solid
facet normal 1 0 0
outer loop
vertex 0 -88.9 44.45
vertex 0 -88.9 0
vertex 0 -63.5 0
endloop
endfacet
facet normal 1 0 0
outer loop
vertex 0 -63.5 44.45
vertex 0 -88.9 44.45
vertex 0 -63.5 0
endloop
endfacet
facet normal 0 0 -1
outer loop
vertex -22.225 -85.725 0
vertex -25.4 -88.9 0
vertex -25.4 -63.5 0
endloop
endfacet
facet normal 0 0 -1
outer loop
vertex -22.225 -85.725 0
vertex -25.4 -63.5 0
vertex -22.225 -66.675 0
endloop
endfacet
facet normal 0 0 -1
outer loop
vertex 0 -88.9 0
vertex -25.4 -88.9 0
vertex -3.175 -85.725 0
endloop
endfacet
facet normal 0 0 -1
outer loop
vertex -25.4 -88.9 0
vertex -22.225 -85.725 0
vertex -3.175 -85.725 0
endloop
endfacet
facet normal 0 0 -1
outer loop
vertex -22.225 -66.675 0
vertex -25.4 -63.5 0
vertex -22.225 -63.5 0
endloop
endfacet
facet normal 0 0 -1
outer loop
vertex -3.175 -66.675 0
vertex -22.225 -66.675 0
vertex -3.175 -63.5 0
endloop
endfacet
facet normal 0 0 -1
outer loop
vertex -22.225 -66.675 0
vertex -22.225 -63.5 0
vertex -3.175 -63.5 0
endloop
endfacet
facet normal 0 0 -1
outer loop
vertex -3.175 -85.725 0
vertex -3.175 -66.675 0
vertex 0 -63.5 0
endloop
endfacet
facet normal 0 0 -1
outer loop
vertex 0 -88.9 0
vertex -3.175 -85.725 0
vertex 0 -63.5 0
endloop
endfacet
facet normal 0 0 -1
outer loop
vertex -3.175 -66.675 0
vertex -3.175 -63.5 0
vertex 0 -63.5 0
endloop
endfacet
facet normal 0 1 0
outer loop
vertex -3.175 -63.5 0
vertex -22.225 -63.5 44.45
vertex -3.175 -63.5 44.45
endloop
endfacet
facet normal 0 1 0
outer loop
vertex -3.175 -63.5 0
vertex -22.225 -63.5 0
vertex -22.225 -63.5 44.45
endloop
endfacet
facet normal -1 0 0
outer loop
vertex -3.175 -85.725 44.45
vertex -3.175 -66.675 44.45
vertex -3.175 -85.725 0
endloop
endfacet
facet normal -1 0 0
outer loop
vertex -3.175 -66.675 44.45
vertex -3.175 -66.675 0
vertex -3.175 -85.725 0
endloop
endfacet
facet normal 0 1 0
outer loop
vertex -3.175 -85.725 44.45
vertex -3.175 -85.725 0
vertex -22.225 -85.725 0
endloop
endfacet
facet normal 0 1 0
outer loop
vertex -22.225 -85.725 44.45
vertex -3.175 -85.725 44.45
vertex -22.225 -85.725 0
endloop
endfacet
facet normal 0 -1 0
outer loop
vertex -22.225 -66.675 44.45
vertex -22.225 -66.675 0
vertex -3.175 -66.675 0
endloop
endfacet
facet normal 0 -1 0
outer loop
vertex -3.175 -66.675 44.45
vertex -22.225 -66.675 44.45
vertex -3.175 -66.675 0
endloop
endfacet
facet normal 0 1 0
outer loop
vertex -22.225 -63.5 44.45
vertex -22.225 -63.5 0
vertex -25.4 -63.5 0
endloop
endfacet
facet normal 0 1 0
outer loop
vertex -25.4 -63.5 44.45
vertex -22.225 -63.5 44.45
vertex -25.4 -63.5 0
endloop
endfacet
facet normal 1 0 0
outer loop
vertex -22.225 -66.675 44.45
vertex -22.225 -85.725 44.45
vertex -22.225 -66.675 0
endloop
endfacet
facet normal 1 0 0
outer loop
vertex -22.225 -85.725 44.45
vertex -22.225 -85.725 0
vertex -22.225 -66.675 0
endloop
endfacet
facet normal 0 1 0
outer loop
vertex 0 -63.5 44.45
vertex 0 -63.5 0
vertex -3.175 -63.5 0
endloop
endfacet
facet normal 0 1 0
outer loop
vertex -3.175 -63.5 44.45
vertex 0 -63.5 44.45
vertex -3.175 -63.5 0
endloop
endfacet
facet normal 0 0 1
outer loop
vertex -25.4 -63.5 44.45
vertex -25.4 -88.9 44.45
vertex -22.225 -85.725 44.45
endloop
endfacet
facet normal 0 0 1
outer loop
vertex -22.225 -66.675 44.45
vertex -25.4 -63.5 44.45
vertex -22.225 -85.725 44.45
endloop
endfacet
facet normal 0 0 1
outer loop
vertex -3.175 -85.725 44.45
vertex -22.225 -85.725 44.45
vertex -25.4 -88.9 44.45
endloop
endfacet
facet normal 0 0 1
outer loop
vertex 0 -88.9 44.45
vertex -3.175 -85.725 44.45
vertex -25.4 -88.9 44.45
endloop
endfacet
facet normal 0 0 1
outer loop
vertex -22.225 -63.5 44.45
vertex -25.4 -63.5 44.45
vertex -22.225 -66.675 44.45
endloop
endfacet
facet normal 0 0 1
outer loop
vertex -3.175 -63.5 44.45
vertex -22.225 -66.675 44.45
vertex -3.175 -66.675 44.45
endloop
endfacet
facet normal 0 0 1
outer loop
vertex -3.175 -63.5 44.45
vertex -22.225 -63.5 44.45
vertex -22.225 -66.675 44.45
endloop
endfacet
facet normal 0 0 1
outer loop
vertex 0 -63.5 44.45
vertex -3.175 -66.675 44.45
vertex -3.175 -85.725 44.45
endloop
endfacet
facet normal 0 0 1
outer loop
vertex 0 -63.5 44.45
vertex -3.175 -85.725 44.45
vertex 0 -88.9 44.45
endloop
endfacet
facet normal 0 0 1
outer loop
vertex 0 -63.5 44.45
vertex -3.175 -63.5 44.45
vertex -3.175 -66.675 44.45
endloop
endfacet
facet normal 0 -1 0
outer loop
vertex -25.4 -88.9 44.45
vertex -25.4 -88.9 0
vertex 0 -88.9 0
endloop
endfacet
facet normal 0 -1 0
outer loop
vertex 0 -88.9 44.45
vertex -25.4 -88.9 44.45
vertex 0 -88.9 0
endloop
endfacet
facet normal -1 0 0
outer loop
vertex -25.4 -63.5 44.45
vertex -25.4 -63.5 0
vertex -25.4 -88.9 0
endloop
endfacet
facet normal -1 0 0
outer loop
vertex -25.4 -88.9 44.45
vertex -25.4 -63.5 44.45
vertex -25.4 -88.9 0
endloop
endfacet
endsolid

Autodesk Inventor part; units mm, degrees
ref_plane "YZ Plane" through (0, 0, 0) normal (1, 0, 0) x (0, 1, 0)
ref_plane "XZ Plane" through (0, 0, 0) normal (0, 1, 0) x (-1, 0, 0)
ref_plane "XY Plane" through (0, 0, 0) normal (0, 0, 1) x (1, 0, 0)
sketch "Sketch1" plane through (0, 0, 0) normal (0, 0, 1) x (1, 0, 0)
  line L0 (-22.225, -63.5) -> (-3.175, -63.5) projected
  line L1 (0, -63.5) -> (-25.4, -63.5)
  line L2 (-25.4, -63.5) -> (-25.4, -88.9)
  line L3 (-25.4, -88.9) -> (0, -88.9)
  line L4 (0, -88.9) -> (0, -63.5)
  line L5 (-22.225, -85.725) -> (-22.225, -66.675)
  line L6 (-22.225, -66.675) -> (-3.175, -66.675)
  line L7 (-3.175, -66.675) -> (-3.175, -85.725)
  line L8 (-3.175, -85.725) -> (-22.225, -85.725)
  point P0 (0, 0)
  dimension "d0" = 25.4
  dimension "d1" = 25.4
  dimension "d2" = 3.175
extrude "Extrusion1" add sketch "Sketch1" along normal blind 44.45
properties part number "2018 Cube Back Stop Vertical"
